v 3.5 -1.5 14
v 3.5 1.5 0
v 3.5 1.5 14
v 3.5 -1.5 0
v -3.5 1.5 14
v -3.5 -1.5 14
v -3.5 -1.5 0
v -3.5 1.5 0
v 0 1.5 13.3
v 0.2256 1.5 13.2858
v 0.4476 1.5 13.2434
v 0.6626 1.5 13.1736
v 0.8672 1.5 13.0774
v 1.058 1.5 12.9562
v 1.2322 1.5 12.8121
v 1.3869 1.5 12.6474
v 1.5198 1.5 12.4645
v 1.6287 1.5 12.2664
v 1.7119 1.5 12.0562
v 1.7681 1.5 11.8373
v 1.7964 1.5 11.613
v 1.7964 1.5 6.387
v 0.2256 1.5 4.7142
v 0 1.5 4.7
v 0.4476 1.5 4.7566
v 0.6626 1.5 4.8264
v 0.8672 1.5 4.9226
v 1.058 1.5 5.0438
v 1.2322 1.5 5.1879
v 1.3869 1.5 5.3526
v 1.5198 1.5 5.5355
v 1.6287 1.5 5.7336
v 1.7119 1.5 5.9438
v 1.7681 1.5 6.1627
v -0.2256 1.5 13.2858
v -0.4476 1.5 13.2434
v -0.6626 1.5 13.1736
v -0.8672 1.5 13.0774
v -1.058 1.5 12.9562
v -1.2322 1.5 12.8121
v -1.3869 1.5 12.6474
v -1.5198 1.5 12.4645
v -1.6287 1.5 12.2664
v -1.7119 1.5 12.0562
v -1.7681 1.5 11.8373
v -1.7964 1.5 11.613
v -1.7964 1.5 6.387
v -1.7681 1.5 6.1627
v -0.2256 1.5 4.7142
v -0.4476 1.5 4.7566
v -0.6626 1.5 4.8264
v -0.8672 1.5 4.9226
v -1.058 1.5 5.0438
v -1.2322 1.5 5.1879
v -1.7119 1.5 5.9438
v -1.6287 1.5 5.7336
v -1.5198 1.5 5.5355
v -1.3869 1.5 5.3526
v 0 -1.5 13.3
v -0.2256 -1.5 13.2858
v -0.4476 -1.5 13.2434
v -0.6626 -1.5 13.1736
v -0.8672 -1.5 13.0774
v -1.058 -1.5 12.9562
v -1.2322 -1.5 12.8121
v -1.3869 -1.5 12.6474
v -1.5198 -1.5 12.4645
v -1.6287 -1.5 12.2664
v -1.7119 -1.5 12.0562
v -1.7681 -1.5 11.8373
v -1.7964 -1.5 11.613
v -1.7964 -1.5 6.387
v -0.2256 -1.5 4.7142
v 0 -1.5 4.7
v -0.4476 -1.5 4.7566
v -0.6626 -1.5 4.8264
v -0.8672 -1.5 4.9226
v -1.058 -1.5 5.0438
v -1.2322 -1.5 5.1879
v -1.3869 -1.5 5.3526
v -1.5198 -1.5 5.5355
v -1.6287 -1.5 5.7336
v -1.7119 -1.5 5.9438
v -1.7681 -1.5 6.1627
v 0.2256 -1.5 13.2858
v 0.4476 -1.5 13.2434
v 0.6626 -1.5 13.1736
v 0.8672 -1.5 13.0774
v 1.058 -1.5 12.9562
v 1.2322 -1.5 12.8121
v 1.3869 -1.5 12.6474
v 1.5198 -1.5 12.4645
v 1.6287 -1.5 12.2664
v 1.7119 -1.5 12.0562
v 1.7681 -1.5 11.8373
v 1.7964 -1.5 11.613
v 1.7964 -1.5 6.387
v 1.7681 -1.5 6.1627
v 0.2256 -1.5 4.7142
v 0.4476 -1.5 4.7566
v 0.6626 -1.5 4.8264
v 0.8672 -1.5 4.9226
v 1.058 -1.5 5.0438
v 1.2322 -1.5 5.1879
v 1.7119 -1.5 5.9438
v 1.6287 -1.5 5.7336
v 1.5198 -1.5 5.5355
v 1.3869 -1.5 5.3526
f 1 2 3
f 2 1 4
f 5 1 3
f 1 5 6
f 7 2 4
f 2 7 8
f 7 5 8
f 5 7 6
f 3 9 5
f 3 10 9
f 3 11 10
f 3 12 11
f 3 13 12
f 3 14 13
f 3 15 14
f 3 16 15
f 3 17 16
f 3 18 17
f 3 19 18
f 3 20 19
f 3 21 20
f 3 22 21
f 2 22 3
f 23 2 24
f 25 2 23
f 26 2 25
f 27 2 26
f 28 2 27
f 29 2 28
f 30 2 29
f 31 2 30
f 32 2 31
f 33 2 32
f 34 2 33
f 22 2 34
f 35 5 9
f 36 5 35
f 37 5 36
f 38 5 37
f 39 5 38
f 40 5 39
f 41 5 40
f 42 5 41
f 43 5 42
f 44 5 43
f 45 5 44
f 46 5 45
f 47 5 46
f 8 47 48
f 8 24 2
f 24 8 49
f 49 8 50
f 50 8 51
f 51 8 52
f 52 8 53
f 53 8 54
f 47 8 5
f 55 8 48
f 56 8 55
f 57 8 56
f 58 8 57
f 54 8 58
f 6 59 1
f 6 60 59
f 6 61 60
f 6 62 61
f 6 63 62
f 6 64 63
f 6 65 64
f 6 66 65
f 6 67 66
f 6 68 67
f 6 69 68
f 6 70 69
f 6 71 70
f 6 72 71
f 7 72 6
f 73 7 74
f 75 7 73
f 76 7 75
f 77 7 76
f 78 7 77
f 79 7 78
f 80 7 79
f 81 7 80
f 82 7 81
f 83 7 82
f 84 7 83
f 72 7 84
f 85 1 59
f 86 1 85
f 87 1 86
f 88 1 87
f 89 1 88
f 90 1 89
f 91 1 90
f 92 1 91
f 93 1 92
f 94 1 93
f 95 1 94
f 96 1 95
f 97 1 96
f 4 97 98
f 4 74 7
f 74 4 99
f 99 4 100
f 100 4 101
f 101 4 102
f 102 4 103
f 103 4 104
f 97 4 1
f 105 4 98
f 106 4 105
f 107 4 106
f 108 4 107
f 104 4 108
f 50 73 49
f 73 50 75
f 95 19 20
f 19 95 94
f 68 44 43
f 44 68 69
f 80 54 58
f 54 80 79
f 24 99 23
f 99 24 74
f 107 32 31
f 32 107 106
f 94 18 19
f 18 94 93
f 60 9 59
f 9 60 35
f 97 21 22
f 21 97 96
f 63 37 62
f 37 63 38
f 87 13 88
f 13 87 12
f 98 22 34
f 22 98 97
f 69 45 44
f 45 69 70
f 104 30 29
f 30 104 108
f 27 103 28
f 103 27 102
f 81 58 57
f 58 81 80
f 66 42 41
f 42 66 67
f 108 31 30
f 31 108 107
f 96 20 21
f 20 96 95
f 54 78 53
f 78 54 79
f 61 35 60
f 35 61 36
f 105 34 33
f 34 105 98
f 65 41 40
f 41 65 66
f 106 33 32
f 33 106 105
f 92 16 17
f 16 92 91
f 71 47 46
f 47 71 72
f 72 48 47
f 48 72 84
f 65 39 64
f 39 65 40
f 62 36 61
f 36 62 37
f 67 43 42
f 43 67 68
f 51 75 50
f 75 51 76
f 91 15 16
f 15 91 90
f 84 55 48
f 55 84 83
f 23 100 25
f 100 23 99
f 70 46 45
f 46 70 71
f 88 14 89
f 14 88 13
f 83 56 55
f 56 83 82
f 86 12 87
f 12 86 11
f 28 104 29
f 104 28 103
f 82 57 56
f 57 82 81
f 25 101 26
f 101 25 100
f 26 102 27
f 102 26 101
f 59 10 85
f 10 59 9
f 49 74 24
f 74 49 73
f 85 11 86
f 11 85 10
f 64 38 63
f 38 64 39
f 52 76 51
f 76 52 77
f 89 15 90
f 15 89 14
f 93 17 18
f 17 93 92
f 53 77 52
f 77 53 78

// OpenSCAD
$fn = 50;

difference() {
	union() {
		translate(v = [-3.5, -1.5, 0]) {
			cube(size = [7, 3, 14]);
		}
	}
	union() {
		translate(v = [0, -1.5, 9.0]) {
			rotate(a = [0, 90, 90]) {
				hull() {
					difference() {
						union() {
							translate(v = [-2.5, 0, 0]) {
								cylinder(h = 3, r = 1.8);
							}
							translate(v = [2.5, 0, 0]) {
								cylinder(h = 3, r = 1.8);
							}
						}
						union();
					}
				}
			}
		}
	}
}
